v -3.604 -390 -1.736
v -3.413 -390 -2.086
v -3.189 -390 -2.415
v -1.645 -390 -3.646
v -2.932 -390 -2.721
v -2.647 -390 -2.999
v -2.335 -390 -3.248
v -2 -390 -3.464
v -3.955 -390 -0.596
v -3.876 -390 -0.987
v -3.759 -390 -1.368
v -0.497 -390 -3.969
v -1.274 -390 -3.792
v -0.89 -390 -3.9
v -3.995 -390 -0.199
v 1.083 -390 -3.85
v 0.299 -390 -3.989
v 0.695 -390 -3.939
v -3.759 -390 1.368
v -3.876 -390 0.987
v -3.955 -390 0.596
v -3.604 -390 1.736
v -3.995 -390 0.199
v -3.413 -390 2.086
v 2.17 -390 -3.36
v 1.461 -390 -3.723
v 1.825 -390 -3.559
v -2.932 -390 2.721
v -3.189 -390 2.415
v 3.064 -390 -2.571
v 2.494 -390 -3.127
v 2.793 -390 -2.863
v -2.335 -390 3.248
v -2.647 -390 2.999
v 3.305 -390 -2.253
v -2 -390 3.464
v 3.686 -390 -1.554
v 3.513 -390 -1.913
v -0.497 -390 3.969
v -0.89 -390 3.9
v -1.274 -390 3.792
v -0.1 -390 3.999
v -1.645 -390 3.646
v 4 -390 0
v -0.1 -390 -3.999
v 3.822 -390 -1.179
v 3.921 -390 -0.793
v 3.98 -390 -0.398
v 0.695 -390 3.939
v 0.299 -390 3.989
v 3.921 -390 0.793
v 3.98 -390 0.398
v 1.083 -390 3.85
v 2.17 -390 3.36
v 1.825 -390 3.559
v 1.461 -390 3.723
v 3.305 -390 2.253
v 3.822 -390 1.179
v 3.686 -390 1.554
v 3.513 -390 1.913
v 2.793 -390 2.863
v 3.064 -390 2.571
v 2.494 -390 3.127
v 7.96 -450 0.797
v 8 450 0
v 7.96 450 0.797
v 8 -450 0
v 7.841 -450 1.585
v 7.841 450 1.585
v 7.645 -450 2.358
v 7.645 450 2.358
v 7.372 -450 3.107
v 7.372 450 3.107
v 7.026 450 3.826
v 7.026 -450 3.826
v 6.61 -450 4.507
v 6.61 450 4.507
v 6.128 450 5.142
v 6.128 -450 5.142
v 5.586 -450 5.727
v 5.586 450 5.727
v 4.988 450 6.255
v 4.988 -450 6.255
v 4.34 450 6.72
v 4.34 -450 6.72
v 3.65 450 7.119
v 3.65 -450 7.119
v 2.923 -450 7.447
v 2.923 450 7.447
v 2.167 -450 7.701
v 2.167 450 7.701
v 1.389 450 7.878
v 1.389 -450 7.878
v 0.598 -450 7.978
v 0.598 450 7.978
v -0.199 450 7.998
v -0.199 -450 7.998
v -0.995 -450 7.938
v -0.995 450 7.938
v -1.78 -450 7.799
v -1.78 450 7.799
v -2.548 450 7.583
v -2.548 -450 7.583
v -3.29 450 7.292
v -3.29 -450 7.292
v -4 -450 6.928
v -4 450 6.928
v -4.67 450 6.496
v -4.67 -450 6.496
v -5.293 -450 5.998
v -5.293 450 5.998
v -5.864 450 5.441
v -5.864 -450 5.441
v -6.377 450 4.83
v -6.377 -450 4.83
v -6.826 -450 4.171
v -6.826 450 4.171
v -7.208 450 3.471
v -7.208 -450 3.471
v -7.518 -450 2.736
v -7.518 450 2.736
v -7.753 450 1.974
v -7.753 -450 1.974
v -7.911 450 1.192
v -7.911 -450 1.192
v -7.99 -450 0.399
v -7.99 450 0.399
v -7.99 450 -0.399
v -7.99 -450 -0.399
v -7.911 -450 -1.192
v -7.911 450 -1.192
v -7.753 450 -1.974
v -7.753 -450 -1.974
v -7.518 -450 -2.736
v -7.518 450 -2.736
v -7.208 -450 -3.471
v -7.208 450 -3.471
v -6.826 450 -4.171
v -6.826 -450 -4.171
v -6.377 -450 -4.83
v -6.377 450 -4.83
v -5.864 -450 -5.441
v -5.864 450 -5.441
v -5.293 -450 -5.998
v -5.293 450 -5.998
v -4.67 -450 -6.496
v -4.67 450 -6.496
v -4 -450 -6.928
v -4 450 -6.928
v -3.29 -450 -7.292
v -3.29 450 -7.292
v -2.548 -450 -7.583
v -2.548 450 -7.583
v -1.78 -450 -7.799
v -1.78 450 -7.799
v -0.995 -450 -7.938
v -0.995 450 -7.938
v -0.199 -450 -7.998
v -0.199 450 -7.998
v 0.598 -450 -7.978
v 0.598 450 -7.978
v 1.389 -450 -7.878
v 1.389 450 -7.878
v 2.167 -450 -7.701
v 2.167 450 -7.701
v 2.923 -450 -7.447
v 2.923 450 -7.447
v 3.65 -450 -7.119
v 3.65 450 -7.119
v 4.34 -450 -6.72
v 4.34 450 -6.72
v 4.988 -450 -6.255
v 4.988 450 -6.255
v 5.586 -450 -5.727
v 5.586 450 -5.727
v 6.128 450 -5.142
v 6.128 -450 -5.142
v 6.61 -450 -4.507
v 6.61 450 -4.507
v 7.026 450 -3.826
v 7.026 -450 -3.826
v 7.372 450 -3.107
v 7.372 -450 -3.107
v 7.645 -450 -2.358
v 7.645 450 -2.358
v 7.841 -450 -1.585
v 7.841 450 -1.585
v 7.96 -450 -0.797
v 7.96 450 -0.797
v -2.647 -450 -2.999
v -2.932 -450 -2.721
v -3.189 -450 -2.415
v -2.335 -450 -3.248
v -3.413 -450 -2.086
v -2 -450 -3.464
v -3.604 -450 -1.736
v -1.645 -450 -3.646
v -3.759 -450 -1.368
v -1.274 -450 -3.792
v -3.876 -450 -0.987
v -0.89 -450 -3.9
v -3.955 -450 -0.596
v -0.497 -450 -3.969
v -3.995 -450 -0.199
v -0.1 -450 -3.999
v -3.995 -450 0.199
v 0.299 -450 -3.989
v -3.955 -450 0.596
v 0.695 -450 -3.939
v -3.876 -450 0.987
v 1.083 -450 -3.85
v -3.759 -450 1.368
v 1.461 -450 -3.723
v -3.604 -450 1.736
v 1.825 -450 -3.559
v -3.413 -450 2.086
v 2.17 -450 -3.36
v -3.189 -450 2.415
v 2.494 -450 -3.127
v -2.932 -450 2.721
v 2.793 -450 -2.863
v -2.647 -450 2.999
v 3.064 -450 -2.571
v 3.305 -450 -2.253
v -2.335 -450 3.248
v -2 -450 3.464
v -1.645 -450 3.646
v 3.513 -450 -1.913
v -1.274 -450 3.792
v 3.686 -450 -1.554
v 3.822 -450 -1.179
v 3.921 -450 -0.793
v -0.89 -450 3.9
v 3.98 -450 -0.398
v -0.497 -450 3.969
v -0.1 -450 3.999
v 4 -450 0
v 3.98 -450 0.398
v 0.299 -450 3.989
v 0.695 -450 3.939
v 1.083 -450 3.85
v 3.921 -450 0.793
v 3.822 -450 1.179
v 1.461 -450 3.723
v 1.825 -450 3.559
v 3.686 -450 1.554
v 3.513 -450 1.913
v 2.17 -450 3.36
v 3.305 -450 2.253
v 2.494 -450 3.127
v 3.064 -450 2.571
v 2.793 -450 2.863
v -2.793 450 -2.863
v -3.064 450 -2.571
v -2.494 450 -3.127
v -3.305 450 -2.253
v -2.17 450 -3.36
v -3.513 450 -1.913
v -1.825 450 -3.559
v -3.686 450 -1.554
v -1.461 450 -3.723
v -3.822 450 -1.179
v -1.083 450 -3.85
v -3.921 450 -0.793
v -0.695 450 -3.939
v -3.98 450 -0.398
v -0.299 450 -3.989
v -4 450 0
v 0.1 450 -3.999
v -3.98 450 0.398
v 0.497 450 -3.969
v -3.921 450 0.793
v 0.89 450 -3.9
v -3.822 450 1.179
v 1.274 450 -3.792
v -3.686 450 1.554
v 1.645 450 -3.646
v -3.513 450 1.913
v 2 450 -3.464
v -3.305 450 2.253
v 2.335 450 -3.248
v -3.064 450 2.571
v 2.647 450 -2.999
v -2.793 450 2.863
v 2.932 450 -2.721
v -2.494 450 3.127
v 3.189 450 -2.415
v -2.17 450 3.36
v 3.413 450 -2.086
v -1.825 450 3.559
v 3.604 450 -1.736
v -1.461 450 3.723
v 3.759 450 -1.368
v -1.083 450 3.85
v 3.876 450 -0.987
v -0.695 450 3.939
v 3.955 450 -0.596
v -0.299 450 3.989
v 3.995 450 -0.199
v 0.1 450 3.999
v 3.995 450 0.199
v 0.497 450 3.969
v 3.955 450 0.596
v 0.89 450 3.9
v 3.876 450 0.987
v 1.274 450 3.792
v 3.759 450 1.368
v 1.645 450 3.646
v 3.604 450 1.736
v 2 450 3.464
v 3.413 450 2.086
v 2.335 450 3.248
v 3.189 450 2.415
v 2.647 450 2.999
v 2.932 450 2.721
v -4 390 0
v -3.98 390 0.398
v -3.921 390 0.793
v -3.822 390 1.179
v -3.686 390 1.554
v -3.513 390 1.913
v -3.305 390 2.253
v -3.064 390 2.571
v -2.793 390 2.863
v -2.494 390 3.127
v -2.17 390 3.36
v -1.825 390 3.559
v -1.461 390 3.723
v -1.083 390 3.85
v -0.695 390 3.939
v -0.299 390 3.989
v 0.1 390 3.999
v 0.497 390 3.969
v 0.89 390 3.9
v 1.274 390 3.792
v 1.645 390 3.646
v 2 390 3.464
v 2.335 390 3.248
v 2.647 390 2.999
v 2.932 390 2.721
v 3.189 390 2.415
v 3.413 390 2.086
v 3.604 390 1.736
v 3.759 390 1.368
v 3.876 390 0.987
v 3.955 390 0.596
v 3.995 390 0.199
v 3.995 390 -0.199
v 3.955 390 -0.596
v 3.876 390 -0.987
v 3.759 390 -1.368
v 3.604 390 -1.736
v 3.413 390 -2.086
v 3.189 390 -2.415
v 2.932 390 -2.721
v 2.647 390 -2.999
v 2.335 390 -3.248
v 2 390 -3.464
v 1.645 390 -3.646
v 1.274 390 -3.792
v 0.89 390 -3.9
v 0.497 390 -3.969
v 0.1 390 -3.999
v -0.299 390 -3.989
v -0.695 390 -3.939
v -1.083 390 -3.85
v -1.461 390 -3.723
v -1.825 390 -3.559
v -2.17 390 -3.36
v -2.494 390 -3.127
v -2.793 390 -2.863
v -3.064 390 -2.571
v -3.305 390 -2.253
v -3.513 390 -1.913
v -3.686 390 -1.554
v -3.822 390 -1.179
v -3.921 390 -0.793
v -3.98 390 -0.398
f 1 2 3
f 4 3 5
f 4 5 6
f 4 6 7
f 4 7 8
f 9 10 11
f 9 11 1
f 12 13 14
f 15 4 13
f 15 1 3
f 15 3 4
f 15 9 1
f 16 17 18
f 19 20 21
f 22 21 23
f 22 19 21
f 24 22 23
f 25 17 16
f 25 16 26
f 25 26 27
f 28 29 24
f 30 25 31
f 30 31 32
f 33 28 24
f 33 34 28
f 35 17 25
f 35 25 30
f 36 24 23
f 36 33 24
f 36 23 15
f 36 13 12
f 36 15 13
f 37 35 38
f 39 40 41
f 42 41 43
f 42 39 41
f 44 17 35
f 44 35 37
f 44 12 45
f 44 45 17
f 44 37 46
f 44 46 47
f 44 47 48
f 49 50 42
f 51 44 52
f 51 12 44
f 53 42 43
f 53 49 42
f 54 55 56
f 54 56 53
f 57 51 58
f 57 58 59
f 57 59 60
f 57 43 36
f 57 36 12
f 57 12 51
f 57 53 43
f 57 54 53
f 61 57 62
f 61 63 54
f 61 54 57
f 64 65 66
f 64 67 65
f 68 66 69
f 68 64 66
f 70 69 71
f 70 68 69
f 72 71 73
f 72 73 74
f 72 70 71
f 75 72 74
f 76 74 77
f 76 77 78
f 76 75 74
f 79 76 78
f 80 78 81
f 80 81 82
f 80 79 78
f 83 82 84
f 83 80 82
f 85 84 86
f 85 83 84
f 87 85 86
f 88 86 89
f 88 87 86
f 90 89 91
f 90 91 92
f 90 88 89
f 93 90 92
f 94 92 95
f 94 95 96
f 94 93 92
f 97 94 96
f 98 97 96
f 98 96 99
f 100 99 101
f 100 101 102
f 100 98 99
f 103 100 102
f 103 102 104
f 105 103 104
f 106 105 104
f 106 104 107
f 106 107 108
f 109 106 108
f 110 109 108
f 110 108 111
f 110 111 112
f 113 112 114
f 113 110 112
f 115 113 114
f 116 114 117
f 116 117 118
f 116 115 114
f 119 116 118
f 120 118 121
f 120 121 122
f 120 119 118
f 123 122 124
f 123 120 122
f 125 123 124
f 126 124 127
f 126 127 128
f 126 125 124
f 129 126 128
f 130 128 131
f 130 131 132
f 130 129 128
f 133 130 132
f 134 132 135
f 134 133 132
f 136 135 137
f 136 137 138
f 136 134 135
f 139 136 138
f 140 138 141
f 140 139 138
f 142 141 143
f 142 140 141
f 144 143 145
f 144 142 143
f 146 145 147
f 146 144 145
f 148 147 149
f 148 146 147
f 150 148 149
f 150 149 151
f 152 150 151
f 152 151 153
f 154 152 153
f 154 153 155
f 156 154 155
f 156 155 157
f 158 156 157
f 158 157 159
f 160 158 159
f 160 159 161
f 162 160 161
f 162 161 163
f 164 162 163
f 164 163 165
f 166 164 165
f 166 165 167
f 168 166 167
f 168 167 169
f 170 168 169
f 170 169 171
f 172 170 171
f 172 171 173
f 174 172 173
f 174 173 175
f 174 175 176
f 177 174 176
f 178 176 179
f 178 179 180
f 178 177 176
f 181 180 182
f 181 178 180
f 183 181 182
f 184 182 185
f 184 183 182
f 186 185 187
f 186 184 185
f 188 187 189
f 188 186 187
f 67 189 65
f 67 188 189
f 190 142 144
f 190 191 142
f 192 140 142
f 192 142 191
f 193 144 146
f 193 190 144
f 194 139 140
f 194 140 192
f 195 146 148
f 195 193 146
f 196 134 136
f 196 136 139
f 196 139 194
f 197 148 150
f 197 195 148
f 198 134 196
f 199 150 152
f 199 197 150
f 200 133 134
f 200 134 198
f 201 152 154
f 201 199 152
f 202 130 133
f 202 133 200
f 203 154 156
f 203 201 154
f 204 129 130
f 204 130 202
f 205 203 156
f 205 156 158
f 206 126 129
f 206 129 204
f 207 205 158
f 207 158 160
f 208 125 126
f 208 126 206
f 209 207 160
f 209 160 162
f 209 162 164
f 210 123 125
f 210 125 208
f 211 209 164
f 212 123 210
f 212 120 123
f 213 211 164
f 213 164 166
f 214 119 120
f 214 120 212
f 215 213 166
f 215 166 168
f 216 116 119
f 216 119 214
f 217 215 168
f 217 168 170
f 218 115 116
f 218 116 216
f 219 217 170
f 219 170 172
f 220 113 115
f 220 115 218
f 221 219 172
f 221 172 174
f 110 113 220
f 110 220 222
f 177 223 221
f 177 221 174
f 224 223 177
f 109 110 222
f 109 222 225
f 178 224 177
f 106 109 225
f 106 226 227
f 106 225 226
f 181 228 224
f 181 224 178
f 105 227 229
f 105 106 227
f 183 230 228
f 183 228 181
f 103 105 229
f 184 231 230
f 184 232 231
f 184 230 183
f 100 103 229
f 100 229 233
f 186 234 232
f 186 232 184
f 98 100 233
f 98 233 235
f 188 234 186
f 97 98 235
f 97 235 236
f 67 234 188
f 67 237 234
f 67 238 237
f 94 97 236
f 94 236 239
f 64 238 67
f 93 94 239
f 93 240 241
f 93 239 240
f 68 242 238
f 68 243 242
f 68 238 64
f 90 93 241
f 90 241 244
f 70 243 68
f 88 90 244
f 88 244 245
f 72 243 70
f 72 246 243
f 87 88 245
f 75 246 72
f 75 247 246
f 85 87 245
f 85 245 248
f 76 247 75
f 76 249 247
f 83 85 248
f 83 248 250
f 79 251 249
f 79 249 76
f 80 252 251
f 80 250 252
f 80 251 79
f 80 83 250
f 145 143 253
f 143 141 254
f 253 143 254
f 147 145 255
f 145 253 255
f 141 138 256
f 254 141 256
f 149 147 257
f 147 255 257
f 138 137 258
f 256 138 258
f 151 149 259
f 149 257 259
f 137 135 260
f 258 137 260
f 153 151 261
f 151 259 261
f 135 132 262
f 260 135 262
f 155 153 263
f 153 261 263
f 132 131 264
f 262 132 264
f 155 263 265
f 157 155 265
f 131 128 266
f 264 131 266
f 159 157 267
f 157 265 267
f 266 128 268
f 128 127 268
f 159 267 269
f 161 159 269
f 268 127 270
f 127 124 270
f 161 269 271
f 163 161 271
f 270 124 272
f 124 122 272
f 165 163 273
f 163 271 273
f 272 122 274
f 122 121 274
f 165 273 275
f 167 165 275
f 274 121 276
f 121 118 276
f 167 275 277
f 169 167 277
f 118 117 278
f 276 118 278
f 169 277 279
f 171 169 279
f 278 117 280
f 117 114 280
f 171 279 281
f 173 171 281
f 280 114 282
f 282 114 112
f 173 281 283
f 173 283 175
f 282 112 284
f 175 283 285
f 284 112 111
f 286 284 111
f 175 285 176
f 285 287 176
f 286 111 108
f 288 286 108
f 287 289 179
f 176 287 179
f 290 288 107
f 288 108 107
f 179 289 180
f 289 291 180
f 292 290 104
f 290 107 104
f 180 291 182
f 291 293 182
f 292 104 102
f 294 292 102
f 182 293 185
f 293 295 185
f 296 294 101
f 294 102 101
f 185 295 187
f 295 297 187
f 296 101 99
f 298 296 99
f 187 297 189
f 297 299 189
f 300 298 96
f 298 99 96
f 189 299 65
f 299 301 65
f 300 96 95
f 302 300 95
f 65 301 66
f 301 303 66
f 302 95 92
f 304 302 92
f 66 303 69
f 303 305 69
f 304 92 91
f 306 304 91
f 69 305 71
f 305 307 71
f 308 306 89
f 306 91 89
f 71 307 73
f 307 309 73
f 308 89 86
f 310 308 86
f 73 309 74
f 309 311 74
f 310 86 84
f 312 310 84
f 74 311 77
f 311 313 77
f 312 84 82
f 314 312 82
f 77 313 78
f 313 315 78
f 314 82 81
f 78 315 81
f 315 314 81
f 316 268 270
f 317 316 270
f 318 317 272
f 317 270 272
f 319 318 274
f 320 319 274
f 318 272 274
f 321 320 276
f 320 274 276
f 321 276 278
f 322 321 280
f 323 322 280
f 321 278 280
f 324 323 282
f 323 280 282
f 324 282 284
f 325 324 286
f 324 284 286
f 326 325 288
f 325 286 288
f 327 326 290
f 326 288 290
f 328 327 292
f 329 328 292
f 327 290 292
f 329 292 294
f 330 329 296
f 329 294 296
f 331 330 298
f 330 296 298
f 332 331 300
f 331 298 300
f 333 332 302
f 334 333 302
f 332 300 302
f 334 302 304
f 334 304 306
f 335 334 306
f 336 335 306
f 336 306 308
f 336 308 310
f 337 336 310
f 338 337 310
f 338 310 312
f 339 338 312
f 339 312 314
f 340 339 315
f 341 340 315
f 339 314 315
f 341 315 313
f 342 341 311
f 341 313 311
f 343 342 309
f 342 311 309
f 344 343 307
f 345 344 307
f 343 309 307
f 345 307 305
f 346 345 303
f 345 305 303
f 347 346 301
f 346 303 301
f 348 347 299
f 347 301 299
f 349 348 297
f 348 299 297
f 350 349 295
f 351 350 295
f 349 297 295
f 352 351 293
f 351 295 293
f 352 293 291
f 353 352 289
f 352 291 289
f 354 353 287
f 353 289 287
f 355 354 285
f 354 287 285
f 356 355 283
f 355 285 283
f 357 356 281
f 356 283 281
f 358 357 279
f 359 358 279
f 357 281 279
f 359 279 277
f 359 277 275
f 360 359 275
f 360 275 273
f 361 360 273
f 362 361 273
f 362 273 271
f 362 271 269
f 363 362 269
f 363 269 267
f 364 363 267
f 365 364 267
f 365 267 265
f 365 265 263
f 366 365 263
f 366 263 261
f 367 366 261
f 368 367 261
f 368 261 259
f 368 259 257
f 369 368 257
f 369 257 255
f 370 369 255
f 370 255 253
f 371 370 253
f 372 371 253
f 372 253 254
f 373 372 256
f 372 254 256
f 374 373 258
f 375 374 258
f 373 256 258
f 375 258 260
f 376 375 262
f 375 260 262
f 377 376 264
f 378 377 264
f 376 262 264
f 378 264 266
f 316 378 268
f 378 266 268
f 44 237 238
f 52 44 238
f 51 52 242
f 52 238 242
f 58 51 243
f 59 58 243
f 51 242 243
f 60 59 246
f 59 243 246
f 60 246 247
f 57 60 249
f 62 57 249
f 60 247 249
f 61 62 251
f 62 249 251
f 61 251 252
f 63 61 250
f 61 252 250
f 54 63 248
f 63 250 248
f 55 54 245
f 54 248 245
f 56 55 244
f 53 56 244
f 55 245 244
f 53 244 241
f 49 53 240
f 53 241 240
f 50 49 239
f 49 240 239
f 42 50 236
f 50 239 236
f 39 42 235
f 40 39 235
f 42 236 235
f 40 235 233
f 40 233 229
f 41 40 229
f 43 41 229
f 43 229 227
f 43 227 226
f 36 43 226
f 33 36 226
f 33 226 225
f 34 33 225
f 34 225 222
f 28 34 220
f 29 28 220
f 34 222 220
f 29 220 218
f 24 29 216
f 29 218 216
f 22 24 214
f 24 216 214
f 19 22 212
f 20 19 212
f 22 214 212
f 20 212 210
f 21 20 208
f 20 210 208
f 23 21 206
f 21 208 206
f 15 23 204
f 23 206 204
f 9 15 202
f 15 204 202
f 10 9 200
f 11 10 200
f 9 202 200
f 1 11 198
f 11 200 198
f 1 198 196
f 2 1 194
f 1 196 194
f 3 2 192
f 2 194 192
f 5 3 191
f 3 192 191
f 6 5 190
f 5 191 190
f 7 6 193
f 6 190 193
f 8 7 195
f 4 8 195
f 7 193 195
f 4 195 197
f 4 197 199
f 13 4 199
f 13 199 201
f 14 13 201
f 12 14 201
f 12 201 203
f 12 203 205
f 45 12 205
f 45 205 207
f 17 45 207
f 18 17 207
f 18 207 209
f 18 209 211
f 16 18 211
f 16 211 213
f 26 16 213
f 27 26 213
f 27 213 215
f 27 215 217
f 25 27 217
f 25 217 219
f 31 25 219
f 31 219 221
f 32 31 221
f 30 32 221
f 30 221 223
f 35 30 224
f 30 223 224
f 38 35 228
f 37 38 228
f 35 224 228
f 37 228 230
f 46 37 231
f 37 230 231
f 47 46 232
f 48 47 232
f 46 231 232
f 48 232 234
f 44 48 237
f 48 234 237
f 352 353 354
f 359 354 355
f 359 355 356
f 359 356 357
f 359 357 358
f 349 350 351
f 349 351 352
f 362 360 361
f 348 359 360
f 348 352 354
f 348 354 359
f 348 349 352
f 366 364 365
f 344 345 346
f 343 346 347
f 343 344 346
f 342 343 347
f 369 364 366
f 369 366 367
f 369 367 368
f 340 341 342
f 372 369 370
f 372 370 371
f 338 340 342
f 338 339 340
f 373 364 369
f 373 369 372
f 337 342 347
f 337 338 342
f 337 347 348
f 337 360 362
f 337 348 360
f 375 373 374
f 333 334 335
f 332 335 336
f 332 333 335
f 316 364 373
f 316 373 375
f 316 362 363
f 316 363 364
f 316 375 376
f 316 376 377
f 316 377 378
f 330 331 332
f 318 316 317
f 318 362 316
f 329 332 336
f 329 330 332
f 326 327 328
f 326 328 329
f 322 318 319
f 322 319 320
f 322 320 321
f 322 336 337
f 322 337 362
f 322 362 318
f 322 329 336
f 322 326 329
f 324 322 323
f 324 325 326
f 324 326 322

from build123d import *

# Parameters (mm, degrees)
F0_R     = 8
F1_DEPTH = 450
F2_R     = 4
F3_DEPTH = 60
F4_R     = 4
F5_DEPTH = 60


with BuildPart() as f1:
    # F0 (on Front) → F1 (new body, symmetric)
    with BuildSketch(Plane.XZ):
        Circle(F0_R)
    extrude(amount=F1_DEPTH, both=True)

    # F2 (on face) → F3 (cut)
    with BuildSketch(Plane.XZ.offset(450)):
        Circle(F2_R)
    extrude(amount=-F3_DEPTH, mode=Mode.SUBTRACT)

    # F4 (on face) → F5 (cut)
    with BuildSketch(Plane(origin=(0, 450, 0), x_dir=(-1, 0, 0), z_dir=(0, 1, 0))):
        Circle(F4_R)
    extrude(amount=-F5_DEPTH, mode=Mode.SUBTRACT)


solid = f1.part
